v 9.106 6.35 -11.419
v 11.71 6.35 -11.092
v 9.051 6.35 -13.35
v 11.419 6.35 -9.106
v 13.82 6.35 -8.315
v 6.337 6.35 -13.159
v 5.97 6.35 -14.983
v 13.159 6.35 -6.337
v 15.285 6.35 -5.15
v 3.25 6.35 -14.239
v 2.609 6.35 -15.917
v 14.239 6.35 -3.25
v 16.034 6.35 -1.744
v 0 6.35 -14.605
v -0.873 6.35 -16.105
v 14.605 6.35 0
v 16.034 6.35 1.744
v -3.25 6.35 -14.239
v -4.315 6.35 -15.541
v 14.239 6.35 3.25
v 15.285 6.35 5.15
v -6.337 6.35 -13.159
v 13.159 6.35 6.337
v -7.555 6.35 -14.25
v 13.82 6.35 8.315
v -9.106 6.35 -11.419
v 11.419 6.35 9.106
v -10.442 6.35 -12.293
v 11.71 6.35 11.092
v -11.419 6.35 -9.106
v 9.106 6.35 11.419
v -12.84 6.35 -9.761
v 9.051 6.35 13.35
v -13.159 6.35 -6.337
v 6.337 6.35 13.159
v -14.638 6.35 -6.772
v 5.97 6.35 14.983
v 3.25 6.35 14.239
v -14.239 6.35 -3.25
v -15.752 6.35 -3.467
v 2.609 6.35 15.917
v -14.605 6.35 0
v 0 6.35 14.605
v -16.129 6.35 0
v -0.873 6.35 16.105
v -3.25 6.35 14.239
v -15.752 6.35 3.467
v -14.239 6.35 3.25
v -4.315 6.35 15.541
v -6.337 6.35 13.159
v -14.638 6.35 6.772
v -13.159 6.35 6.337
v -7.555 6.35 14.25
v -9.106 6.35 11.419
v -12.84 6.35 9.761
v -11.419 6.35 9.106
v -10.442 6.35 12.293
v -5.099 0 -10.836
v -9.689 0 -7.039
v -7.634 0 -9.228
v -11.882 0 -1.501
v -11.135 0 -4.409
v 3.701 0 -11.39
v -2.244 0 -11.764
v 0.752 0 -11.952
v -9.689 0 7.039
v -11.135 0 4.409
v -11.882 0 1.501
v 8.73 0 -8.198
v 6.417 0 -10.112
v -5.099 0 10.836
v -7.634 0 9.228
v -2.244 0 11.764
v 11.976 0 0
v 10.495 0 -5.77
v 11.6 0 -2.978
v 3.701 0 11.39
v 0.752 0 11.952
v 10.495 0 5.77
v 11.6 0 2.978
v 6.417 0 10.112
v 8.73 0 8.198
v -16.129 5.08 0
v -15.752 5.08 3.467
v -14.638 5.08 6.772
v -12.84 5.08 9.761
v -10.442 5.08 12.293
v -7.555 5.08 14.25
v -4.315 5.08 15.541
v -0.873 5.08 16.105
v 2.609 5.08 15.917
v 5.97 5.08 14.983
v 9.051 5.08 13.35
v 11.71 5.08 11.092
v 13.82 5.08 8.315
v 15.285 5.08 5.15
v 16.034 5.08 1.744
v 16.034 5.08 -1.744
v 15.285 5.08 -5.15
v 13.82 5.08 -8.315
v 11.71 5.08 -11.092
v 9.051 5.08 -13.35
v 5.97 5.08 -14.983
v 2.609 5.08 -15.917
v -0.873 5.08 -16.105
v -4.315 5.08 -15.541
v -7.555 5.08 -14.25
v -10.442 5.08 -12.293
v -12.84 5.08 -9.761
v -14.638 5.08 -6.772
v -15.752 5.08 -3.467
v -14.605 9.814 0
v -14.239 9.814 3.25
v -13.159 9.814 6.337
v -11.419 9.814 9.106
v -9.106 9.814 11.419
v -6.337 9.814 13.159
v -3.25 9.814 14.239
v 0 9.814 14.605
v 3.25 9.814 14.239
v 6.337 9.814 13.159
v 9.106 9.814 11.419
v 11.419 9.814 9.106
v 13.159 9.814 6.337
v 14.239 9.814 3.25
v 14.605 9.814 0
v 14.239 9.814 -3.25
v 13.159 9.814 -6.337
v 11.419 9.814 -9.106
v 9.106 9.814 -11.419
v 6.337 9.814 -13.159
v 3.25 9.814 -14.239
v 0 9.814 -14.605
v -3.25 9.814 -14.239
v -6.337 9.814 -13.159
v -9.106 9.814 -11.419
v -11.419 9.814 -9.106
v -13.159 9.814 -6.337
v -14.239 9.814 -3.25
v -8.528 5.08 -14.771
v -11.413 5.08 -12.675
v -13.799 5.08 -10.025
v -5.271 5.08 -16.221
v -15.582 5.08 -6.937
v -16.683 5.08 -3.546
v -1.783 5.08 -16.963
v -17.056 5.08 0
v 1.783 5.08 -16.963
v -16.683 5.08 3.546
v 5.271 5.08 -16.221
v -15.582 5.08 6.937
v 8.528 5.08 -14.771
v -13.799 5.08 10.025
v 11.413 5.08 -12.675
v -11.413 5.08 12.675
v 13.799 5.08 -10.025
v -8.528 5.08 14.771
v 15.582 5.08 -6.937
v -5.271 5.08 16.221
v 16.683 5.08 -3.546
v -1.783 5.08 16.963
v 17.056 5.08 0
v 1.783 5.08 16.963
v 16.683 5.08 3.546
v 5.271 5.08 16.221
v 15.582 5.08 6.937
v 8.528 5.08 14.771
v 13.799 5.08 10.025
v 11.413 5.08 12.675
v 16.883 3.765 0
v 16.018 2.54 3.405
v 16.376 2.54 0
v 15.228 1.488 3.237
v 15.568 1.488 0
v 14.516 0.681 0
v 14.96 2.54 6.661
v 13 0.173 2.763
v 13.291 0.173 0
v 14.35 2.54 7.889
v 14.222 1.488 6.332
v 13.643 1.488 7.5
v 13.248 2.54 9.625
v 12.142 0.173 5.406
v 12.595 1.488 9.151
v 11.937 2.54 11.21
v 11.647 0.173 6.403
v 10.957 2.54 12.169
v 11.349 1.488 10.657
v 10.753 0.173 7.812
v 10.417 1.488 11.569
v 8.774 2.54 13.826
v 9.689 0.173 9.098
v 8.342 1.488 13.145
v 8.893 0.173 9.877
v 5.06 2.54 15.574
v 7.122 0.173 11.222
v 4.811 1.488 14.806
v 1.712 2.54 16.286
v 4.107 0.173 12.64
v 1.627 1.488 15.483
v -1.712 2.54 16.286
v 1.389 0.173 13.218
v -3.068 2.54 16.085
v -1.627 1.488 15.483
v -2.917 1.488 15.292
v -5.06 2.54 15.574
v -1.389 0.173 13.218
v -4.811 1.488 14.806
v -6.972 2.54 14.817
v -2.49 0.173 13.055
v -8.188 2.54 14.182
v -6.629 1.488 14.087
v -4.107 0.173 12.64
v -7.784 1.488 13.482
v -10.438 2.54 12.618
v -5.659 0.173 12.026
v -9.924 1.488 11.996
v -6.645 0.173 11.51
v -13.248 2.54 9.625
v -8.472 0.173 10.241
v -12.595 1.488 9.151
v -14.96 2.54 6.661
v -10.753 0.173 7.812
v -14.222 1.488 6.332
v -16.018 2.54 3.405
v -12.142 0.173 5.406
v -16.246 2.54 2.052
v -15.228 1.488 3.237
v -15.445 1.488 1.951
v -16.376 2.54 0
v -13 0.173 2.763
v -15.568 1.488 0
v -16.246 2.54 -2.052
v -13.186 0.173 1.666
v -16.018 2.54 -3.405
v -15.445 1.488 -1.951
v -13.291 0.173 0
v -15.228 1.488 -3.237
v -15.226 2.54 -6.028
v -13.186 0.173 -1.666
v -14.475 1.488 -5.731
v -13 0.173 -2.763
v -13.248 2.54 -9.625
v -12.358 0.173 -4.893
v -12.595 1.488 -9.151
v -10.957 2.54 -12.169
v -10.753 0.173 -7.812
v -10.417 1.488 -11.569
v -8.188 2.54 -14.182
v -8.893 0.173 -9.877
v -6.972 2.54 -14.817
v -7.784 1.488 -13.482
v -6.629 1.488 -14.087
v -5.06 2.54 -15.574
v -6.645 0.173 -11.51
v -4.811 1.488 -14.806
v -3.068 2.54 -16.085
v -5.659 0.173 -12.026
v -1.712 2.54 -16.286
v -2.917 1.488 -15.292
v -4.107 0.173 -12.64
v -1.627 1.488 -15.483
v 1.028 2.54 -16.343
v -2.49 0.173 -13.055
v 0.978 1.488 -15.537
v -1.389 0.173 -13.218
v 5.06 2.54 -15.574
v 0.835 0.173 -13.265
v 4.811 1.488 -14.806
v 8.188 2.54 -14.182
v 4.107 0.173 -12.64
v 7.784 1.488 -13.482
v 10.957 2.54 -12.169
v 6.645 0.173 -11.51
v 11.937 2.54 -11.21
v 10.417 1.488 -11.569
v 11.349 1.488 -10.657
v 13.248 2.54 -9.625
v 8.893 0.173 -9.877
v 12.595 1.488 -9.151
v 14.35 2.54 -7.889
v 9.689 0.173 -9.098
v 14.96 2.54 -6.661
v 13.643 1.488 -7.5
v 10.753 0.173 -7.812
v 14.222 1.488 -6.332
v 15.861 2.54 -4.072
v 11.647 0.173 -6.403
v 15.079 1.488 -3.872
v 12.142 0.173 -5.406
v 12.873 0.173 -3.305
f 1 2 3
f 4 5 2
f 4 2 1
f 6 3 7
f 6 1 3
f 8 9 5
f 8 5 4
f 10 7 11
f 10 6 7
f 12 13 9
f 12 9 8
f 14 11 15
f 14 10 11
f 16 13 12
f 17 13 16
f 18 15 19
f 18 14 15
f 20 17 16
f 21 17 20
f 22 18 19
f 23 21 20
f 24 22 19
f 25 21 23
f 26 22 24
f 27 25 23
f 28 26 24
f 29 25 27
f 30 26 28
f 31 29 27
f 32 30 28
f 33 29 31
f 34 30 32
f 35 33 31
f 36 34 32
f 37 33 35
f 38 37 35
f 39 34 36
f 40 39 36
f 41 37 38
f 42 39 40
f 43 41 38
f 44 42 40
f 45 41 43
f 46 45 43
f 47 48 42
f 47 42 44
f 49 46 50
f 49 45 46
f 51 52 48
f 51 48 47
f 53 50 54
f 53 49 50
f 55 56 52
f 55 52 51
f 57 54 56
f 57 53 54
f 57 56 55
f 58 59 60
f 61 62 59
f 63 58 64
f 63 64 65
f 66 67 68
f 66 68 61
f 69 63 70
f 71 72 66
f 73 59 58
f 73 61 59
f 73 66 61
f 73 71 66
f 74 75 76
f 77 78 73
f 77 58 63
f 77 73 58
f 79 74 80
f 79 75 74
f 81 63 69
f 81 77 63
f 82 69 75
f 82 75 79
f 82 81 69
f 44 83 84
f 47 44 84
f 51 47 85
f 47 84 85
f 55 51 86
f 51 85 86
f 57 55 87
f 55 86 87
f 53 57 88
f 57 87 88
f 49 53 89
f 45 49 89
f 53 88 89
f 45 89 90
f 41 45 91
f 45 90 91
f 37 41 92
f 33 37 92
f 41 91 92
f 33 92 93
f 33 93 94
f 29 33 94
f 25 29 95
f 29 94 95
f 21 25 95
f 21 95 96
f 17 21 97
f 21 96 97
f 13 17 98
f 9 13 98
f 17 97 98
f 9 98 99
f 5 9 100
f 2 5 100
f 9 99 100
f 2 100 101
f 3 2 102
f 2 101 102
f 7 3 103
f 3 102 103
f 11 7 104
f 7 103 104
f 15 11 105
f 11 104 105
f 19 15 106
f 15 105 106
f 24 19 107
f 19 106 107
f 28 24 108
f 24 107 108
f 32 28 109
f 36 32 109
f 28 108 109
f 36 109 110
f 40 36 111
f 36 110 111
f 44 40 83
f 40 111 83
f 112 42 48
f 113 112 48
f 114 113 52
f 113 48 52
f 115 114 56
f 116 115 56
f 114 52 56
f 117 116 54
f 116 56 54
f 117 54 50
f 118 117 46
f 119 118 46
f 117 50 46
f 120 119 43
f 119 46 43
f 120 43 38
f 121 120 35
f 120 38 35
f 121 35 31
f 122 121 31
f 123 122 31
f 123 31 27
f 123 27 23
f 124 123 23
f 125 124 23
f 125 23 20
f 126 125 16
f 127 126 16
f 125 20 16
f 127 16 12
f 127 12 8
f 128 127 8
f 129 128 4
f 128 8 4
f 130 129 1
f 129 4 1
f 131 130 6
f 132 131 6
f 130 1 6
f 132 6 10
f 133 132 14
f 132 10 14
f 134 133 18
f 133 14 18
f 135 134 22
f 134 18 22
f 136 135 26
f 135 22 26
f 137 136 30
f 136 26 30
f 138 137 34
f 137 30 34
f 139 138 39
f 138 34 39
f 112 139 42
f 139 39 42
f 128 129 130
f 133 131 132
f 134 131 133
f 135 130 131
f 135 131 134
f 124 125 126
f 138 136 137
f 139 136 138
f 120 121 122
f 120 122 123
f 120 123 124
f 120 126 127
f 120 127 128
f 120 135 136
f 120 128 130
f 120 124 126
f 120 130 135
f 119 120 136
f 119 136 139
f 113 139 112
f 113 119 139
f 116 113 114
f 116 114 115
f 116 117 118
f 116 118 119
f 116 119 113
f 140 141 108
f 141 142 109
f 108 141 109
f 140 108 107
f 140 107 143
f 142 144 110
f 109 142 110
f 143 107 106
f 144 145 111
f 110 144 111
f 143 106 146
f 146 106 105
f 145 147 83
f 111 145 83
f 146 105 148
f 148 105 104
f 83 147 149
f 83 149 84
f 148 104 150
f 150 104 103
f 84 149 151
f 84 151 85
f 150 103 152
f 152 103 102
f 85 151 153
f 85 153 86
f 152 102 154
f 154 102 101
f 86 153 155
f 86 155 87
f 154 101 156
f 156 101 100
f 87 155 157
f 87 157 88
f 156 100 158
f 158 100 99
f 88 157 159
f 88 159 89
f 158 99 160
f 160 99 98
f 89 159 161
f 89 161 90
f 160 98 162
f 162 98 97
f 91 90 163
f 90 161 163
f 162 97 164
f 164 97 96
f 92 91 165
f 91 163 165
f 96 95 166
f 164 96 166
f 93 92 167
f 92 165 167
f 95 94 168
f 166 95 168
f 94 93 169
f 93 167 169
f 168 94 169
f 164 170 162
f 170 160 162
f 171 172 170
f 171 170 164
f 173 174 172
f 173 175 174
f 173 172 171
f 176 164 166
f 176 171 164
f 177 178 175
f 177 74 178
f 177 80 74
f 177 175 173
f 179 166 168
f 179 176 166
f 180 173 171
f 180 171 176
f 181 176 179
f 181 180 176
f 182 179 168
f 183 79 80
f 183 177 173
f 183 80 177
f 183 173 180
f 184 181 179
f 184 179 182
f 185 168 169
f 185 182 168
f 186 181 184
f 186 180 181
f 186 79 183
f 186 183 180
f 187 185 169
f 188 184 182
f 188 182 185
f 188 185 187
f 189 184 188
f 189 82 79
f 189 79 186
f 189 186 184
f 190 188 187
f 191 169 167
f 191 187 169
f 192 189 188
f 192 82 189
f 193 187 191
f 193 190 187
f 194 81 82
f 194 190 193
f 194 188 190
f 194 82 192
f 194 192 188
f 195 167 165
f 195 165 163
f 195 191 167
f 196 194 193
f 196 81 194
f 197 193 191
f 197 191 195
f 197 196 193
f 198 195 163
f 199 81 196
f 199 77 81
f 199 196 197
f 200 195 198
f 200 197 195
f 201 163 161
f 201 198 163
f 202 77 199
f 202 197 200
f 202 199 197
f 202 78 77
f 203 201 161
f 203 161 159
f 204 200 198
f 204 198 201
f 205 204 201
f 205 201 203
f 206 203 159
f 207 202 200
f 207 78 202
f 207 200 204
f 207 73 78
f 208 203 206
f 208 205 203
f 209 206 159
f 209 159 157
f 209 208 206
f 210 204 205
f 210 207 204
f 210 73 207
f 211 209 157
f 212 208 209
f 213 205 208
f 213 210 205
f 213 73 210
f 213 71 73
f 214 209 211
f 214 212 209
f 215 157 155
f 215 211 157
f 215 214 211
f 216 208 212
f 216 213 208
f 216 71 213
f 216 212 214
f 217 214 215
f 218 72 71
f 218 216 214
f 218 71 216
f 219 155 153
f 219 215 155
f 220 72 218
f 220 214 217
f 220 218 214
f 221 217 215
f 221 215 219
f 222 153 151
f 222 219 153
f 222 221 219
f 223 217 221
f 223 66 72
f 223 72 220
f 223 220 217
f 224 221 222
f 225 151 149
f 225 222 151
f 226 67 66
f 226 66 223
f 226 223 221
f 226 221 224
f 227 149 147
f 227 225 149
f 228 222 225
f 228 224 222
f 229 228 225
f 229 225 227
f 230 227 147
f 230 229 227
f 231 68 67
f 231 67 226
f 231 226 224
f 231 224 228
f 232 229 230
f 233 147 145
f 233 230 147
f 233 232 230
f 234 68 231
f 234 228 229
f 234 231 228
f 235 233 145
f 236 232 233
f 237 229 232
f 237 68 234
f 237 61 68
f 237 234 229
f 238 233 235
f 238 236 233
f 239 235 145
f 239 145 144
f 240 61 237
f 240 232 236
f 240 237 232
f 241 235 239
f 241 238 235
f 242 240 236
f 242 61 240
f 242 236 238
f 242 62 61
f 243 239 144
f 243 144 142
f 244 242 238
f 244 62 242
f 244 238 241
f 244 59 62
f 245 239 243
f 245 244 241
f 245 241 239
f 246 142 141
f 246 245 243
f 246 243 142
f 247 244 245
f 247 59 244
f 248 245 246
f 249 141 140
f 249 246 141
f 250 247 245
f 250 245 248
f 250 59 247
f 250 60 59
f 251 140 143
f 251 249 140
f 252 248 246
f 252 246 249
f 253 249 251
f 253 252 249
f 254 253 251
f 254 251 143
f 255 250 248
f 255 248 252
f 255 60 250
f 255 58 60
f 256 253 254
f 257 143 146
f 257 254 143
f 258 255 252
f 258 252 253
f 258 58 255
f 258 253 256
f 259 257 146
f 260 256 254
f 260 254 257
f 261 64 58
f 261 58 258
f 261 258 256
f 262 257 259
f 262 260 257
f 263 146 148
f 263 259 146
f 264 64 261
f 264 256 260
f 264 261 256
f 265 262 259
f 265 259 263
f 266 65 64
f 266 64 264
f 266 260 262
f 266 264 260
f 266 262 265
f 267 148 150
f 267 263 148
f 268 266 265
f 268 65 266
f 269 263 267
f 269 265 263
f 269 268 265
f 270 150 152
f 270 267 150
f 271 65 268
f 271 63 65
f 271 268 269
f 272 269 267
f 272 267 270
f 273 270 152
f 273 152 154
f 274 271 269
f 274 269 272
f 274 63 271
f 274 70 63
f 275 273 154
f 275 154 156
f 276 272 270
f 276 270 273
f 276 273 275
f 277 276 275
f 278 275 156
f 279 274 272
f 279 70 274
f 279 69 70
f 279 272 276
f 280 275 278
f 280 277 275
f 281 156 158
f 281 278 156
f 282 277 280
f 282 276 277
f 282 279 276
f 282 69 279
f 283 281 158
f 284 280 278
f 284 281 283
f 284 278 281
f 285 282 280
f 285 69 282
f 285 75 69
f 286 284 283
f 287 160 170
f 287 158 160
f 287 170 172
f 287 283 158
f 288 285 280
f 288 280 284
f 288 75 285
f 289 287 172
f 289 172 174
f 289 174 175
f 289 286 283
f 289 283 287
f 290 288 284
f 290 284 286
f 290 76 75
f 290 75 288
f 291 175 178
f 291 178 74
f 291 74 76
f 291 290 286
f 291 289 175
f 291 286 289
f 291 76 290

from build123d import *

# Parameters (mm, degrees)
F0_R     = 17.0561
F1_DEPTH = 5.08
F2_R     = 16.129
F3_DEPTH = 1.27
F4_R     = 5.07999
F5_R     = 14.605
F6_DEPTH = 3.4642005339


# Not quite as in the source:
# - a fillet or chamfer is up to 0.001 mm smaller than in the source, because OpenCascade refuses the exact size


with BuildPart() as f1:
    # F0 (on Front) → F1 (new body)
    with BuildSketch(Plane.XZ):
        Circle(F0_R)
    extrude(amount=-F1_DEPTH)

    # F2 (on face) → F3 (join)
    with BuildSketch(Plane(origin=(0, 5.08, 0), x_dir=(-1, 0, 0), z_dir=(0, 1, 0))):
        Circle(F2_R)
    extrude(amount=F3_DEPTH)

    # F4 (radius 5.08 in the source; OpenCascade refuses exactly that, so slightly less here)
    f4_edges = [f1.edges().sort_by_distance(p)[0] for p in [
        (-17.0561, 0, 0),
    ]]
    fillet(f4_edges, radius=F4_R)

    # F5 (on face) → F6 (join)
    with BuildSketch(Plane(origin=(0, 6.35, 0), x_dir=(-1, 0, 0), z_dir=(0, 1, 0))):
        Circle(F5_R)
    extrude(amount=F6_DEPTH)


solid = f1.part
